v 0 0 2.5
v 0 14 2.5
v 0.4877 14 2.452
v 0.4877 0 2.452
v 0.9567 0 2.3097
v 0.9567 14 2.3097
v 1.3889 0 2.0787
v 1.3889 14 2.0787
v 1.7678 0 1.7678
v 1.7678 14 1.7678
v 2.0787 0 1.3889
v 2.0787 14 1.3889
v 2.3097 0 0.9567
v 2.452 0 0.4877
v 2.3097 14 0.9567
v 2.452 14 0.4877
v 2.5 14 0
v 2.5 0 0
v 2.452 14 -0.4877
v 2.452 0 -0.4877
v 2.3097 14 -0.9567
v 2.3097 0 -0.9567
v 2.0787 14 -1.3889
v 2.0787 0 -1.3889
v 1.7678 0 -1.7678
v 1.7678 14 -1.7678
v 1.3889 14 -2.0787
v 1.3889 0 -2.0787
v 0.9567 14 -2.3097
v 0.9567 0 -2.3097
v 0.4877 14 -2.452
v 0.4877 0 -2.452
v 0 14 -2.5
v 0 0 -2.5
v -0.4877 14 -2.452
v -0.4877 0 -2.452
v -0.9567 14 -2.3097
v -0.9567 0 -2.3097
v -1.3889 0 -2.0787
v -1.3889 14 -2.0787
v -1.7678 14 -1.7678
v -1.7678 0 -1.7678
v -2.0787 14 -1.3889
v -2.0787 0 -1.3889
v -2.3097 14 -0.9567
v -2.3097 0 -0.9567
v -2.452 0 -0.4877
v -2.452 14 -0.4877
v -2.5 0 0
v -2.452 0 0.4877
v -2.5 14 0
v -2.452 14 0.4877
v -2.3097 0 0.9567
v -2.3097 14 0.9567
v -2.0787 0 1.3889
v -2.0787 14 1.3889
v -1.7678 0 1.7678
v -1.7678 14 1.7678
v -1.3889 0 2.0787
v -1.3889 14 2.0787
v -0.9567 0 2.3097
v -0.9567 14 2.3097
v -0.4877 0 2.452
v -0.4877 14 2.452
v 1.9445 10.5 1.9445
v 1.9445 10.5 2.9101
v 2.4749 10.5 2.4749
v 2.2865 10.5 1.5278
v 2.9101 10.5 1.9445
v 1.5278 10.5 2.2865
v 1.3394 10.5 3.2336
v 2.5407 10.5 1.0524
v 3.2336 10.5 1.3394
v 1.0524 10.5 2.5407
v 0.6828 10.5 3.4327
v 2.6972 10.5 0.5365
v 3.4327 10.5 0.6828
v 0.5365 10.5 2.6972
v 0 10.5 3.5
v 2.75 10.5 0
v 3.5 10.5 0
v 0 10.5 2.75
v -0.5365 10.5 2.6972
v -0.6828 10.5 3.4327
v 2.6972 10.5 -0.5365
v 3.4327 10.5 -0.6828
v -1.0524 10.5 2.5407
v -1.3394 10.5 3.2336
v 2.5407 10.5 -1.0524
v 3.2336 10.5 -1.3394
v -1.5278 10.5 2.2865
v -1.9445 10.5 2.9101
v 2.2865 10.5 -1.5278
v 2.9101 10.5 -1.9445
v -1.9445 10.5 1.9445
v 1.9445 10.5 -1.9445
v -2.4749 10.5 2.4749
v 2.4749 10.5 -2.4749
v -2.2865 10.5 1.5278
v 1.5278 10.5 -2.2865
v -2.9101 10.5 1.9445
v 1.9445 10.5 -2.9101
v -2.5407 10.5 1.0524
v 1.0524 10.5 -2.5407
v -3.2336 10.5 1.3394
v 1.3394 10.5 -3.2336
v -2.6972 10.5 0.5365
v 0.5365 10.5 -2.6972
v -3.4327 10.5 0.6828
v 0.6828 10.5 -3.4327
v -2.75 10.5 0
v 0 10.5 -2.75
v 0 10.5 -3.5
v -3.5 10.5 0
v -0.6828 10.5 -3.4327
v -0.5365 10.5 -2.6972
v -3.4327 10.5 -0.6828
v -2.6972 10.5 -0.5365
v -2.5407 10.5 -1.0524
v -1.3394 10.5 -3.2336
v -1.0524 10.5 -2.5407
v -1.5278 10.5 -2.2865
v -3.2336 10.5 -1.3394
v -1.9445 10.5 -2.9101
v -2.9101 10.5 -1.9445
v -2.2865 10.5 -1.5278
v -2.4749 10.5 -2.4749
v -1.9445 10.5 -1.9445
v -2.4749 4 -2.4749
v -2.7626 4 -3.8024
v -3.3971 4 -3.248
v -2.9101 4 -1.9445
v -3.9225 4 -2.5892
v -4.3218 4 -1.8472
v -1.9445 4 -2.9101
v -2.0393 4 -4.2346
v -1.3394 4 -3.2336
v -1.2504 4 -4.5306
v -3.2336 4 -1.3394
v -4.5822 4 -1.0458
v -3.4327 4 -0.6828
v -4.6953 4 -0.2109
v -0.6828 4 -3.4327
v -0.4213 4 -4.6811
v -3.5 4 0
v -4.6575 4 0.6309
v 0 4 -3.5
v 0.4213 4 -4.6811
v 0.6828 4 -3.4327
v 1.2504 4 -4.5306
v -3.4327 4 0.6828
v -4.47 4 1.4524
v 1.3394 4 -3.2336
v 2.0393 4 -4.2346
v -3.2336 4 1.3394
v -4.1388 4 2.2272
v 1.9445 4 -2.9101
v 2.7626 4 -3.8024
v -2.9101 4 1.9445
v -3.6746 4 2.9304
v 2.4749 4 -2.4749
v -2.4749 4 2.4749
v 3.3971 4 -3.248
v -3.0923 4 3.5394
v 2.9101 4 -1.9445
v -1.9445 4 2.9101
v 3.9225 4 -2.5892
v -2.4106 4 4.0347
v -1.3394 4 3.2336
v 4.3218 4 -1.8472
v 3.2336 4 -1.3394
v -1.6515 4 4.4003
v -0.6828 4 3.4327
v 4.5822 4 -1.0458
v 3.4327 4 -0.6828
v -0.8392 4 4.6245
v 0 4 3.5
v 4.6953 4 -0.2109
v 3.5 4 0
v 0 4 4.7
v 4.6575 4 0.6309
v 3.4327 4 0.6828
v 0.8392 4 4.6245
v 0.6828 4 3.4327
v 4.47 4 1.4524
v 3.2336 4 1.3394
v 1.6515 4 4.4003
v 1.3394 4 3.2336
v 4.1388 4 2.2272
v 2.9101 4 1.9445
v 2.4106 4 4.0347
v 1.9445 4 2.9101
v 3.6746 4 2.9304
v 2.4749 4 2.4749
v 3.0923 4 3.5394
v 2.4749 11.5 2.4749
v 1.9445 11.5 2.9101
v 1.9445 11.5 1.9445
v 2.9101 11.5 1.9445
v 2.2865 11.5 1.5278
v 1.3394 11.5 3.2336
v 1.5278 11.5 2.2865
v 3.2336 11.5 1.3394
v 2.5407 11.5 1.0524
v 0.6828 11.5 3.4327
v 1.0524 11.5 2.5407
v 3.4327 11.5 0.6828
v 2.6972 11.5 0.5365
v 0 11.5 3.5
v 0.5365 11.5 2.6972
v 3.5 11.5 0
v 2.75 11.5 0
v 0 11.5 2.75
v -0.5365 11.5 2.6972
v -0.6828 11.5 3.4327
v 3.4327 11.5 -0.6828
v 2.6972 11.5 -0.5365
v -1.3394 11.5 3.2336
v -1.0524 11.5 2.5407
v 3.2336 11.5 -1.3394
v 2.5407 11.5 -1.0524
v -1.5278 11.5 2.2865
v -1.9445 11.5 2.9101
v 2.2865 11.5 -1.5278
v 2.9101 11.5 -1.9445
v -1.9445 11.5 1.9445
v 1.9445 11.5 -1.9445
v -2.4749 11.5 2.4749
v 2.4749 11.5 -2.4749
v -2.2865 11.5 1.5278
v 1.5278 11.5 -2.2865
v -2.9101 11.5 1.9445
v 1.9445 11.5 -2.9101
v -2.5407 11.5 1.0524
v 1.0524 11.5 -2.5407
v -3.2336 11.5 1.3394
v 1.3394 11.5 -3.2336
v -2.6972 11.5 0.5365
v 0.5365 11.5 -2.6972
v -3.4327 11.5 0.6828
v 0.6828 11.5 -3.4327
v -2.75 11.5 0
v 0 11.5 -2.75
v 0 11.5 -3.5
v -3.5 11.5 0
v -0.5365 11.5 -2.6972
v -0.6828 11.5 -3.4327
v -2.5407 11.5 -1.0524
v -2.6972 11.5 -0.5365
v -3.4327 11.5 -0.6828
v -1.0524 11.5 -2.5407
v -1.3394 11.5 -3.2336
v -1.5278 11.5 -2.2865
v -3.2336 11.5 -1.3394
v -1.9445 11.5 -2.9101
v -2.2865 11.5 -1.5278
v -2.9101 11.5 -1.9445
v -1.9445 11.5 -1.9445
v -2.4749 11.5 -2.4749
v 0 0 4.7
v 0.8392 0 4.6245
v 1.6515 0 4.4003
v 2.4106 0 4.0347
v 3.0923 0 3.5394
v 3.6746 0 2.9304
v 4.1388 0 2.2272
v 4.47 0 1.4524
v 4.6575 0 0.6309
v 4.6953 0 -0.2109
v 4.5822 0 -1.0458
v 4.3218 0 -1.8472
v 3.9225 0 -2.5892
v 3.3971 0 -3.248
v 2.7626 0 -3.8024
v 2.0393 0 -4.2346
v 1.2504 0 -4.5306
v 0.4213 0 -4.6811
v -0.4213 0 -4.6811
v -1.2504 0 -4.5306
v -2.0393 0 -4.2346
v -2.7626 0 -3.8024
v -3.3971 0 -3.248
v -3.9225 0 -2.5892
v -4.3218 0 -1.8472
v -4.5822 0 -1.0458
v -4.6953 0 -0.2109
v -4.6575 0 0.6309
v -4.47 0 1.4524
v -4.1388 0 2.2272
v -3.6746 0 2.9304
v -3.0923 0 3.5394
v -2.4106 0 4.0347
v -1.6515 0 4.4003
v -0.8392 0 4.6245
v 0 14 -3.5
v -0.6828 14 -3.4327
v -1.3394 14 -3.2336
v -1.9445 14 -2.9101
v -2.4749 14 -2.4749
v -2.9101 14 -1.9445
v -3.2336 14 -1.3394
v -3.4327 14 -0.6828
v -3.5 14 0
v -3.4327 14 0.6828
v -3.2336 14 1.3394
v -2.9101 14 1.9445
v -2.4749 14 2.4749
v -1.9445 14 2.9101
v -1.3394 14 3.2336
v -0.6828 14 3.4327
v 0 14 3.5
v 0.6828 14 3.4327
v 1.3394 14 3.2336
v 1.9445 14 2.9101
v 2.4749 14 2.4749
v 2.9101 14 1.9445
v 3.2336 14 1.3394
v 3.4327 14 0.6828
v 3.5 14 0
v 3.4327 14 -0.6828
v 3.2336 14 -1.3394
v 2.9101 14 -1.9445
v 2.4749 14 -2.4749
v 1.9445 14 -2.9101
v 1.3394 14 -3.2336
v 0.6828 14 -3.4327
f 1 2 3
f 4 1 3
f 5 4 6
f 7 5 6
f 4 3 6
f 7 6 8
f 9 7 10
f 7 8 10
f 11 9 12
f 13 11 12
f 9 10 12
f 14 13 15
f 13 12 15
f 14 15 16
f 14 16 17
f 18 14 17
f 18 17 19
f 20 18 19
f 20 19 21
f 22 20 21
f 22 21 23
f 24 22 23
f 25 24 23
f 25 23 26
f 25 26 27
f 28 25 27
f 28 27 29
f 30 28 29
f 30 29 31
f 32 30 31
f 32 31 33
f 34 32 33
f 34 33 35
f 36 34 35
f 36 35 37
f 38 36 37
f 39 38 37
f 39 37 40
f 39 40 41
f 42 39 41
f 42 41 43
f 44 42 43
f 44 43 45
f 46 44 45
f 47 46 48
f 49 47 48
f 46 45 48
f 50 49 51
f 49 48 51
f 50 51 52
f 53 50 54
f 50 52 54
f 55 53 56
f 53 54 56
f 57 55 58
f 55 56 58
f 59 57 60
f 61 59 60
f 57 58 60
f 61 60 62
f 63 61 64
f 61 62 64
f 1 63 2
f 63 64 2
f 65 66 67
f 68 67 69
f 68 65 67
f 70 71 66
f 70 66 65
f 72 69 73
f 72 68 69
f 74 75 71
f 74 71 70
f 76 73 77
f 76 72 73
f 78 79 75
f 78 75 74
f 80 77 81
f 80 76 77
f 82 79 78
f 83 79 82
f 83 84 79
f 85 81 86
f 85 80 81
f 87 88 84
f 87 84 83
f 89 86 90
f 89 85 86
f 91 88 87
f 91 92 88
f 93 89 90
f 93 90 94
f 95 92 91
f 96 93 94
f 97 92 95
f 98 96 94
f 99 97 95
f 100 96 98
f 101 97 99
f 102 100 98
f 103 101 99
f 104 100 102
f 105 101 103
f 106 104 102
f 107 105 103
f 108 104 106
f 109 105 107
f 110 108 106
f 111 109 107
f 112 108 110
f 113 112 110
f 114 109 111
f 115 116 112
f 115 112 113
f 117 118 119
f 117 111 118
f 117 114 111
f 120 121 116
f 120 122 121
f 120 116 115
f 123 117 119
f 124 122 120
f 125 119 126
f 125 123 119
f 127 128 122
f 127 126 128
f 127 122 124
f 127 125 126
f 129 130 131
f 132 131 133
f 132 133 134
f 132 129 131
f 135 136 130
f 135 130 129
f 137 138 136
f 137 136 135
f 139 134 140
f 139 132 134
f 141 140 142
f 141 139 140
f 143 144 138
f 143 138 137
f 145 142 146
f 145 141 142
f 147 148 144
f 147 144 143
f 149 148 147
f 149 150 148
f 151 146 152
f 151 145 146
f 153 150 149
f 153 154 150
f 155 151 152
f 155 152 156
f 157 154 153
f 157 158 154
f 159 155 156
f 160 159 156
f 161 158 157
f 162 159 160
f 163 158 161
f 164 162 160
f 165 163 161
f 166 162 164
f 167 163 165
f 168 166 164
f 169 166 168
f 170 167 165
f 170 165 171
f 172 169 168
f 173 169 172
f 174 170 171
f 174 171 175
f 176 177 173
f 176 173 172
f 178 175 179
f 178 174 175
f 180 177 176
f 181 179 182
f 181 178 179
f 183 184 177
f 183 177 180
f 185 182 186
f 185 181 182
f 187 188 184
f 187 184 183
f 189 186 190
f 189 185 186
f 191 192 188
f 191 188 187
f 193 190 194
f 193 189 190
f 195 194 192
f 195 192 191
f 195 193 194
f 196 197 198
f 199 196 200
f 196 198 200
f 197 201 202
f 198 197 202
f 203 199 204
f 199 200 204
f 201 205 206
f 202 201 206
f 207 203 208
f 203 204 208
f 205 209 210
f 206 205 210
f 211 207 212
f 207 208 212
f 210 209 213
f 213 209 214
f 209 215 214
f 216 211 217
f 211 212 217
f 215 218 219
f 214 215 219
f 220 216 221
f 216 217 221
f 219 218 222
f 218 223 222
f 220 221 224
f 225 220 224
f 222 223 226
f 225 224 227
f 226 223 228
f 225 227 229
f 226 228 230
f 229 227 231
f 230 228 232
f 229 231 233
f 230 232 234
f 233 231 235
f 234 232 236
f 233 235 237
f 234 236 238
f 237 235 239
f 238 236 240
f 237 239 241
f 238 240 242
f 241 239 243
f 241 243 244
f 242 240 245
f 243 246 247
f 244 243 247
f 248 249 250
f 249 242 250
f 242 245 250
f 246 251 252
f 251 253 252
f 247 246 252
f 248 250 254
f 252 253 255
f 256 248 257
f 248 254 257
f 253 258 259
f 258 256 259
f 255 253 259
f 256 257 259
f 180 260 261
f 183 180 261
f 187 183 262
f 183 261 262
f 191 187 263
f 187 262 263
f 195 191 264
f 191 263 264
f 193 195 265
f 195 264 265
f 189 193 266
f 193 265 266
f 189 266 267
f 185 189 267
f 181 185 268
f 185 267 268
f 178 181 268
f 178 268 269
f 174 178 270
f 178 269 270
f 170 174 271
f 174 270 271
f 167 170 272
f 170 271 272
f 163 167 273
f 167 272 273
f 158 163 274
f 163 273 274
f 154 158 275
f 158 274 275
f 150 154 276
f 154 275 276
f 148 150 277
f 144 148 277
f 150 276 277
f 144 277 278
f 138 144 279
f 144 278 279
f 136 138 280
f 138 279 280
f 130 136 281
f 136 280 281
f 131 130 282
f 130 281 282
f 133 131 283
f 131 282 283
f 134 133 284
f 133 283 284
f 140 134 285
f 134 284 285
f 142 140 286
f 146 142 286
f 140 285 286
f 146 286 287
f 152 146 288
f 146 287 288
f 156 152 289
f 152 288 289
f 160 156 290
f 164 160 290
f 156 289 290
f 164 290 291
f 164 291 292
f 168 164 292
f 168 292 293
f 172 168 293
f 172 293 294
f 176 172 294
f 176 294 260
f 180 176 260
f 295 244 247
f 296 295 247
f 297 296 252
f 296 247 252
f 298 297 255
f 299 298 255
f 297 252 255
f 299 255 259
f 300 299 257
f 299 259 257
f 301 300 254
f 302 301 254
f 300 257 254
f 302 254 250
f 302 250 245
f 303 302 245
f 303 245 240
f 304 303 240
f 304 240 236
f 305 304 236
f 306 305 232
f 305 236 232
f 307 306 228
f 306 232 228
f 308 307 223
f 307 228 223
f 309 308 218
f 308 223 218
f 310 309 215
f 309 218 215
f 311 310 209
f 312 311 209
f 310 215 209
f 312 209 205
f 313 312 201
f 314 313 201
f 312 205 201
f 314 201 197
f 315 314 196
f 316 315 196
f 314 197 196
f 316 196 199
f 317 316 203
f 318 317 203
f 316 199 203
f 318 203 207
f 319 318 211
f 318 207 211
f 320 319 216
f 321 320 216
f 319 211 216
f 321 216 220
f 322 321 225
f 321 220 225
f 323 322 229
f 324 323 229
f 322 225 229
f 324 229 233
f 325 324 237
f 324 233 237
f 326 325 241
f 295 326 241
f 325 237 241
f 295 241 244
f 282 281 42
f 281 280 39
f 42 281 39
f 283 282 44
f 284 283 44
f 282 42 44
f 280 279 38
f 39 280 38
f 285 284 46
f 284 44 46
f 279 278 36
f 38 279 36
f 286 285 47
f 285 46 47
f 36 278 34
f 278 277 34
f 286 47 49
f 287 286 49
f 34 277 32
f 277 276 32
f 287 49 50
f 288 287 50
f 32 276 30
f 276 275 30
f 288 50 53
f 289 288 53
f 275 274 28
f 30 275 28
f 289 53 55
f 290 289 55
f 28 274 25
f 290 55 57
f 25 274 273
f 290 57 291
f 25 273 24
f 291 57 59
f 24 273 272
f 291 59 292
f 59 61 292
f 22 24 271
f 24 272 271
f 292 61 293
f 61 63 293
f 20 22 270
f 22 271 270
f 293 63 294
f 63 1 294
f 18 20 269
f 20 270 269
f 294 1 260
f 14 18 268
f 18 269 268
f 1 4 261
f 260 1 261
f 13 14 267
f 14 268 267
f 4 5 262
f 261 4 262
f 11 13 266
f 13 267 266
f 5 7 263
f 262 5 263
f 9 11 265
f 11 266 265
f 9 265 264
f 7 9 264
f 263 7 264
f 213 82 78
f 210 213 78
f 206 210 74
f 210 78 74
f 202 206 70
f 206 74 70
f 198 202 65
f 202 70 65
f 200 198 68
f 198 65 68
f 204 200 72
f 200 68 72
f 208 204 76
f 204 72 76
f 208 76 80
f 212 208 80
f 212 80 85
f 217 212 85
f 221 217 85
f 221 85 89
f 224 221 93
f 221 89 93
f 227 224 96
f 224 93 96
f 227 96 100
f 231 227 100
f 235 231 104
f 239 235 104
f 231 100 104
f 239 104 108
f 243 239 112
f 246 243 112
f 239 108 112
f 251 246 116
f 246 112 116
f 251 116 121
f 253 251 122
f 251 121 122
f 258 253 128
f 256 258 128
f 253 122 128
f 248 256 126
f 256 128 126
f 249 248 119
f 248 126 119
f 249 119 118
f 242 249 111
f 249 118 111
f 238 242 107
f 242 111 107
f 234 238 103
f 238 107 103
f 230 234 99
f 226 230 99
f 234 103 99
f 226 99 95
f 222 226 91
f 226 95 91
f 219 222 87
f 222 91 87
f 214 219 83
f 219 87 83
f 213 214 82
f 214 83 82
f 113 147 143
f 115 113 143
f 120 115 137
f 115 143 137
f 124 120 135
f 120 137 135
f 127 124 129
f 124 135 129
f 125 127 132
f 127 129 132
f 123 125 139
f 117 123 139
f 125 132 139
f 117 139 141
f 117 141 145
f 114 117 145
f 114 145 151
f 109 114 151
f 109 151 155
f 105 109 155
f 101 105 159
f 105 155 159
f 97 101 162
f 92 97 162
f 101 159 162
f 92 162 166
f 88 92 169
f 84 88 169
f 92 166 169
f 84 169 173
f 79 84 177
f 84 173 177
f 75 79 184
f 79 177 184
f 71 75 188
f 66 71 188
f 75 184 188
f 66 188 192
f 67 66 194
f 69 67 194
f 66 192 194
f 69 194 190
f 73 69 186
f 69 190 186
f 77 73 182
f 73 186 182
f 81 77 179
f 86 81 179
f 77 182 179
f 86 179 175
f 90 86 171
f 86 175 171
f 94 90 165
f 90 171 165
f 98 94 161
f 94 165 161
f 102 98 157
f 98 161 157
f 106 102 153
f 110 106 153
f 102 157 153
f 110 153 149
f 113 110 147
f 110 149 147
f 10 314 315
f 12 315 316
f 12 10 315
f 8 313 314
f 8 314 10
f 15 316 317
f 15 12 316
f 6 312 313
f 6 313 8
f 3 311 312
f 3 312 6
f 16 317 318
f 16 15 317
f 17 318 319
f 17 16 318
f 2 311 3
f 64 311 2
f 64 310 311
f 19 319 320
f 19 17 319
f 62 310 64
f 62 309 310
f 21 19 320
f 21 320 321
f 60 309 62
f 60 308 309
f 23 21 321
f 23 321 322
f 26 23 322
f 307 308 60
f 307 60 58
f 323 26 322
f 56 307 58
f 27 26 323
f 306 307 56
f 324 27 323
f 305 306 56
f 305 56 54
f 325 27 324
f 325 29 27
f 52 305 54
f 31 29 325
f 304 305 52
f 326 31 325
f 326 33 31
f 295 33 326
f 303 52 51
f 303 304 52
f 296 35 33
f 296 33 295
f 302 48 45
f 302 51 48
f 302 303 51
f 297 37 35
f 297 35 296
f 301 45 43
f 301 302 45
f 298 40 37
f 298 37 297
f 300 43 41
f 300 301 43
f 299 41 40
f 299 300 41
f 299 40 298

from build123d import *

# Parameters (mm, degrees)
SKETCH1_R           = 4.7
BOSS_EXTRUDE1_DEPTH = 4
SKETCH2_R           = 3.5
BOSS_EXTRUDE2_DEPTH = 6.5
SKETCH3_R           = 2.75
BOSS_EXTRUDE3_DEPTH = 1
SKETCH4_R           = 3.5
BOSS_EXTRUDE4_DEPTH = 2.5
SKETCH5_R           = 2.5
CUT_EXTRUDE1_DEPTH  = 16.497741771


with BuildPart() as part:
    # Sketch1 → Boss-Extrude1 (new body)
    with BuildSketch(Plane(origin=(0, 0, 0), x_dir=(1, 0, 0), z_dir=(0, 1, 0))):
        with Locations(Location((0, 0, 0), (0, 0, 270))):
            Circle(SKETCH1_R)
    extrude(amount=BOSS_EXTRUDE1_DEPTH)

    # Sketch2 → Boss-Extrude2 (add)
    with BuildSketch(Plane(origin=(0, 4, 0), x_dir=(1, 0, 0), z_dir=(0, 1, 0))):
        with Locations(Location((0, 0, 0), (0, 0, 90))):
            Circle(SKETCH2_R)
    extrude(amount=BOSS_EXTRUDE2_DEPTH)

    # Sketch3 → Boss-Extrude3 (add)
    with BuildSketch(Plane(origin=(0, 10.5, 0), x_dir=(1, 0, 0), z_dir=(0, 1, 0))):
        with Locations(Location((0, 0, 0), (0, 0, 270))):
            Circle(SKETCH3_R)
    extrude(amount=BOSS_EXTRUDE3_DEPTH)

    # Sketch4 → Boss-Extrude4 (add)
    with BuildSketch(Plane(origin=(0, 11.5, 0), x_dir=(1, 0, 0), z_dir=(0, 1, 0))):
        with Locations(Location((0, 0, 0), (0, 0, 90))):
            Circle(SKETCH4_R)
    extrude(amount=BOSS_EXTRUDE4_DEPTH)

    # Sketch5 → Cut-Extrude1 (cut, through all)
    with BuildSketch(Plane(origin=(0, 14, 0), x_dir=(1, 0, 0), z_dir=(0, 1, 0))):
        with Locations(Location((0, 0, 0), (0, 0, 270))):
            Circle(SKETCH5_R)
    extrude(amount=-CUT_EXTRUDE1_DEPTH, mode=Mode.SUBTRACT)


solid = part.part
